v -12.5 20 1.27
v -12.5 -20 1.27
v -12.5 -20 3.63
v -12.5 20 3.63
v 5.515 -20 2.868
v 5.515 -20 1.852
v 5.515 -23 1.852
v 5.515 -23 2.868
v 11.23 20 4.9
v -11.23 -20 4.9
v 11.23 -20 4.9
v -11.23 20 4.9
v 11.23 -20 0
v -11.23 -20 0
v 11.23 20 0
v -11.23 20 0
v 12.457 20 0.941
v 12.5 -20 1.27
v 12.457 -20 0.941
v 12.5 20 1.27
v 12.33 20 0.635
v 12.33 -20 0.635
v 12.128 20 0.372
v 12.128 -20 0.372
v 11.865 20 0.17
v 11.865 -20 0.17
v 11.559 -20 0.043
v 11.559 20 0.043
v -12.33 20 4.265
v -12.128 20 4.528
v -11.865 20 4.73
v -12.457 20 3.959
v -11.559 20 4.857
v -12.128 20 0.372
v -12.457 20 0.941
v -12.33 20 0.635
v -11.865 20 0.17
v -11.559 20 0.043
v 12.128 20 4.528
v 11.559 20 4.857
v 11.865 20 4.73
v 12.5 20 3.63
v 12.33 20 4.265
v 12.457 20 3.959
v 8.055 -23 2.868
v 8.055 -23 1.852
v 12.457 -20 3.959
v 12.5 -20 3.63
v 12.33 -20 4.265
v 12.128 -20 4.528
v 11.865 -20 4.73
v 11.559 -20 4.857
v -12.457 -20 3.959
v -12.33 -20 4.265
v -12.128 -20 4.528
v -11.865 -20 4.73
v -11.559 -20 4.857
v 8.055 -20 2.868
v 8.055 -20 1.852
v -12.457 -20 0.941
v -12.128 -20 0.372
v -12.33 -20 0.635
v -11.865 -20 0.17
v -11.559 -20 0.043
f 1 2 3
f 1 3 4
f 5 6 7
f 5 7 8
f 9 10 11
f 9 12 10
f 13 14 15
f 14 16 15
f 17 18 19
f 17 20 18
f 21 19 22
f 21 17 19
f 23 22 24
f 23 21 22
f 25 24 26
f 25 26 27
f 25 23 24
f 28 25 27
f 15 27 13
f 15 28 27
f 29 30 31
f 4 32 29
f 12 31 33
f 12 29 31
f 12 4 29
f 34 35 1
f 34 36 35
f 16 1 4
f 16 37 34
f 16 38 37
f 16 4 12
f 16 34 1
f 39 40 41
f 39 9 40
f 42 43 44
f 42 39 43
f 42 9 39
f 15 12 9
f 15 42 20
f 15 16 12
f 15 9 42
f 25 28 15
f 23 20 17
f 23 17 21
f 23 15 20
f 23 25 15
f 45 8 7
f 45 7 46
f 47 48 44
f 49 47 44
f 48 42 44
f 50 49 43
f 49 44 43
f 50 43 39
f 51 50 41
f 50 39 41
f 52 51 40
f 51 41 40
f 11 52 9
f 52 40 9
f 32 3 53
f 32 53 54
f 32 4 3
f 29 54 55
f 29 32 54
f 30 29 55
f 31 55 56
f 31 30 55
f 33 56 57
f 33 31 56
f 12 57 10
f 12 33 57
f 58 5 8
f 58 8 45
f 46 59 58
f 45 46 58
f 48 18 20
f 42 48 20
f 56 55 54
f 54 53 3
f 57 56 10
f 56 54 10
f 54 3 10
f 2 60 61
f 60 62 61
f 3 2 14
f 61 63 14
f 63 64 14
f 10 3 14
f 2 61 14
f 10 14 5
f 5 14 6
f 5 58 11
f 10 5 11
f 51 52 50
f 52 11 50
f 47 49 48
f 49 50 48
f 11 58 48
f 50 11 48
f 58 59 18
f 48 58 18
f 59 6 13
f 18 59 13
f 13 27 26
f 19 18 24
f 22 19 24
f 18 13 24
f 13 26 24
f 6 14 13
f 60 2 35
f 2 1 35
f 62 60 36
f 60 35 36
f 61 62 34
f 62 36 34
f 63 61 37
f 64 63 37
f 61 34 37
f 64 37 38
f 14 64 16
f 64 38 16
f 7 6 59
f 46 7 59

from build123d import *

# Parameters (mm, degrees)
F0_W     = 25
F0_H     = 40
F1_DEPTH = 4.9
F2_R     = 1.27
F3_W     = 2.54
F3_H     = 1.016
F4_DEPTH = 3


with BuildPart() as f1:
    # F0 (on Top) → F1 (new body)
    with BuildSketch(Plane.XY):
        Rectangle(F0_W, F0_H)
    extrude(amount=F1_DEPTH)

    # F2
    f2_edges = [f1.edges().sort_by_distance(p)[0] for p in [
        (-12.5, 0, 4.9),
        (12.5, 0, 4.9),
        (12.5, 0, 0),
        (-12.5, 0, 0),
    ]]
    fillet(f2_edges, radius=F2_R)

    # F3 (on face) → F4 (join)
    with BuildSketch(Plane.XZ.offset(20)):
        with Locations((6.785, 2.36)):
            Rectangle(F3_W, F3_H)
    extrude(amount=F4_DEPTH)


solid = f1.part
